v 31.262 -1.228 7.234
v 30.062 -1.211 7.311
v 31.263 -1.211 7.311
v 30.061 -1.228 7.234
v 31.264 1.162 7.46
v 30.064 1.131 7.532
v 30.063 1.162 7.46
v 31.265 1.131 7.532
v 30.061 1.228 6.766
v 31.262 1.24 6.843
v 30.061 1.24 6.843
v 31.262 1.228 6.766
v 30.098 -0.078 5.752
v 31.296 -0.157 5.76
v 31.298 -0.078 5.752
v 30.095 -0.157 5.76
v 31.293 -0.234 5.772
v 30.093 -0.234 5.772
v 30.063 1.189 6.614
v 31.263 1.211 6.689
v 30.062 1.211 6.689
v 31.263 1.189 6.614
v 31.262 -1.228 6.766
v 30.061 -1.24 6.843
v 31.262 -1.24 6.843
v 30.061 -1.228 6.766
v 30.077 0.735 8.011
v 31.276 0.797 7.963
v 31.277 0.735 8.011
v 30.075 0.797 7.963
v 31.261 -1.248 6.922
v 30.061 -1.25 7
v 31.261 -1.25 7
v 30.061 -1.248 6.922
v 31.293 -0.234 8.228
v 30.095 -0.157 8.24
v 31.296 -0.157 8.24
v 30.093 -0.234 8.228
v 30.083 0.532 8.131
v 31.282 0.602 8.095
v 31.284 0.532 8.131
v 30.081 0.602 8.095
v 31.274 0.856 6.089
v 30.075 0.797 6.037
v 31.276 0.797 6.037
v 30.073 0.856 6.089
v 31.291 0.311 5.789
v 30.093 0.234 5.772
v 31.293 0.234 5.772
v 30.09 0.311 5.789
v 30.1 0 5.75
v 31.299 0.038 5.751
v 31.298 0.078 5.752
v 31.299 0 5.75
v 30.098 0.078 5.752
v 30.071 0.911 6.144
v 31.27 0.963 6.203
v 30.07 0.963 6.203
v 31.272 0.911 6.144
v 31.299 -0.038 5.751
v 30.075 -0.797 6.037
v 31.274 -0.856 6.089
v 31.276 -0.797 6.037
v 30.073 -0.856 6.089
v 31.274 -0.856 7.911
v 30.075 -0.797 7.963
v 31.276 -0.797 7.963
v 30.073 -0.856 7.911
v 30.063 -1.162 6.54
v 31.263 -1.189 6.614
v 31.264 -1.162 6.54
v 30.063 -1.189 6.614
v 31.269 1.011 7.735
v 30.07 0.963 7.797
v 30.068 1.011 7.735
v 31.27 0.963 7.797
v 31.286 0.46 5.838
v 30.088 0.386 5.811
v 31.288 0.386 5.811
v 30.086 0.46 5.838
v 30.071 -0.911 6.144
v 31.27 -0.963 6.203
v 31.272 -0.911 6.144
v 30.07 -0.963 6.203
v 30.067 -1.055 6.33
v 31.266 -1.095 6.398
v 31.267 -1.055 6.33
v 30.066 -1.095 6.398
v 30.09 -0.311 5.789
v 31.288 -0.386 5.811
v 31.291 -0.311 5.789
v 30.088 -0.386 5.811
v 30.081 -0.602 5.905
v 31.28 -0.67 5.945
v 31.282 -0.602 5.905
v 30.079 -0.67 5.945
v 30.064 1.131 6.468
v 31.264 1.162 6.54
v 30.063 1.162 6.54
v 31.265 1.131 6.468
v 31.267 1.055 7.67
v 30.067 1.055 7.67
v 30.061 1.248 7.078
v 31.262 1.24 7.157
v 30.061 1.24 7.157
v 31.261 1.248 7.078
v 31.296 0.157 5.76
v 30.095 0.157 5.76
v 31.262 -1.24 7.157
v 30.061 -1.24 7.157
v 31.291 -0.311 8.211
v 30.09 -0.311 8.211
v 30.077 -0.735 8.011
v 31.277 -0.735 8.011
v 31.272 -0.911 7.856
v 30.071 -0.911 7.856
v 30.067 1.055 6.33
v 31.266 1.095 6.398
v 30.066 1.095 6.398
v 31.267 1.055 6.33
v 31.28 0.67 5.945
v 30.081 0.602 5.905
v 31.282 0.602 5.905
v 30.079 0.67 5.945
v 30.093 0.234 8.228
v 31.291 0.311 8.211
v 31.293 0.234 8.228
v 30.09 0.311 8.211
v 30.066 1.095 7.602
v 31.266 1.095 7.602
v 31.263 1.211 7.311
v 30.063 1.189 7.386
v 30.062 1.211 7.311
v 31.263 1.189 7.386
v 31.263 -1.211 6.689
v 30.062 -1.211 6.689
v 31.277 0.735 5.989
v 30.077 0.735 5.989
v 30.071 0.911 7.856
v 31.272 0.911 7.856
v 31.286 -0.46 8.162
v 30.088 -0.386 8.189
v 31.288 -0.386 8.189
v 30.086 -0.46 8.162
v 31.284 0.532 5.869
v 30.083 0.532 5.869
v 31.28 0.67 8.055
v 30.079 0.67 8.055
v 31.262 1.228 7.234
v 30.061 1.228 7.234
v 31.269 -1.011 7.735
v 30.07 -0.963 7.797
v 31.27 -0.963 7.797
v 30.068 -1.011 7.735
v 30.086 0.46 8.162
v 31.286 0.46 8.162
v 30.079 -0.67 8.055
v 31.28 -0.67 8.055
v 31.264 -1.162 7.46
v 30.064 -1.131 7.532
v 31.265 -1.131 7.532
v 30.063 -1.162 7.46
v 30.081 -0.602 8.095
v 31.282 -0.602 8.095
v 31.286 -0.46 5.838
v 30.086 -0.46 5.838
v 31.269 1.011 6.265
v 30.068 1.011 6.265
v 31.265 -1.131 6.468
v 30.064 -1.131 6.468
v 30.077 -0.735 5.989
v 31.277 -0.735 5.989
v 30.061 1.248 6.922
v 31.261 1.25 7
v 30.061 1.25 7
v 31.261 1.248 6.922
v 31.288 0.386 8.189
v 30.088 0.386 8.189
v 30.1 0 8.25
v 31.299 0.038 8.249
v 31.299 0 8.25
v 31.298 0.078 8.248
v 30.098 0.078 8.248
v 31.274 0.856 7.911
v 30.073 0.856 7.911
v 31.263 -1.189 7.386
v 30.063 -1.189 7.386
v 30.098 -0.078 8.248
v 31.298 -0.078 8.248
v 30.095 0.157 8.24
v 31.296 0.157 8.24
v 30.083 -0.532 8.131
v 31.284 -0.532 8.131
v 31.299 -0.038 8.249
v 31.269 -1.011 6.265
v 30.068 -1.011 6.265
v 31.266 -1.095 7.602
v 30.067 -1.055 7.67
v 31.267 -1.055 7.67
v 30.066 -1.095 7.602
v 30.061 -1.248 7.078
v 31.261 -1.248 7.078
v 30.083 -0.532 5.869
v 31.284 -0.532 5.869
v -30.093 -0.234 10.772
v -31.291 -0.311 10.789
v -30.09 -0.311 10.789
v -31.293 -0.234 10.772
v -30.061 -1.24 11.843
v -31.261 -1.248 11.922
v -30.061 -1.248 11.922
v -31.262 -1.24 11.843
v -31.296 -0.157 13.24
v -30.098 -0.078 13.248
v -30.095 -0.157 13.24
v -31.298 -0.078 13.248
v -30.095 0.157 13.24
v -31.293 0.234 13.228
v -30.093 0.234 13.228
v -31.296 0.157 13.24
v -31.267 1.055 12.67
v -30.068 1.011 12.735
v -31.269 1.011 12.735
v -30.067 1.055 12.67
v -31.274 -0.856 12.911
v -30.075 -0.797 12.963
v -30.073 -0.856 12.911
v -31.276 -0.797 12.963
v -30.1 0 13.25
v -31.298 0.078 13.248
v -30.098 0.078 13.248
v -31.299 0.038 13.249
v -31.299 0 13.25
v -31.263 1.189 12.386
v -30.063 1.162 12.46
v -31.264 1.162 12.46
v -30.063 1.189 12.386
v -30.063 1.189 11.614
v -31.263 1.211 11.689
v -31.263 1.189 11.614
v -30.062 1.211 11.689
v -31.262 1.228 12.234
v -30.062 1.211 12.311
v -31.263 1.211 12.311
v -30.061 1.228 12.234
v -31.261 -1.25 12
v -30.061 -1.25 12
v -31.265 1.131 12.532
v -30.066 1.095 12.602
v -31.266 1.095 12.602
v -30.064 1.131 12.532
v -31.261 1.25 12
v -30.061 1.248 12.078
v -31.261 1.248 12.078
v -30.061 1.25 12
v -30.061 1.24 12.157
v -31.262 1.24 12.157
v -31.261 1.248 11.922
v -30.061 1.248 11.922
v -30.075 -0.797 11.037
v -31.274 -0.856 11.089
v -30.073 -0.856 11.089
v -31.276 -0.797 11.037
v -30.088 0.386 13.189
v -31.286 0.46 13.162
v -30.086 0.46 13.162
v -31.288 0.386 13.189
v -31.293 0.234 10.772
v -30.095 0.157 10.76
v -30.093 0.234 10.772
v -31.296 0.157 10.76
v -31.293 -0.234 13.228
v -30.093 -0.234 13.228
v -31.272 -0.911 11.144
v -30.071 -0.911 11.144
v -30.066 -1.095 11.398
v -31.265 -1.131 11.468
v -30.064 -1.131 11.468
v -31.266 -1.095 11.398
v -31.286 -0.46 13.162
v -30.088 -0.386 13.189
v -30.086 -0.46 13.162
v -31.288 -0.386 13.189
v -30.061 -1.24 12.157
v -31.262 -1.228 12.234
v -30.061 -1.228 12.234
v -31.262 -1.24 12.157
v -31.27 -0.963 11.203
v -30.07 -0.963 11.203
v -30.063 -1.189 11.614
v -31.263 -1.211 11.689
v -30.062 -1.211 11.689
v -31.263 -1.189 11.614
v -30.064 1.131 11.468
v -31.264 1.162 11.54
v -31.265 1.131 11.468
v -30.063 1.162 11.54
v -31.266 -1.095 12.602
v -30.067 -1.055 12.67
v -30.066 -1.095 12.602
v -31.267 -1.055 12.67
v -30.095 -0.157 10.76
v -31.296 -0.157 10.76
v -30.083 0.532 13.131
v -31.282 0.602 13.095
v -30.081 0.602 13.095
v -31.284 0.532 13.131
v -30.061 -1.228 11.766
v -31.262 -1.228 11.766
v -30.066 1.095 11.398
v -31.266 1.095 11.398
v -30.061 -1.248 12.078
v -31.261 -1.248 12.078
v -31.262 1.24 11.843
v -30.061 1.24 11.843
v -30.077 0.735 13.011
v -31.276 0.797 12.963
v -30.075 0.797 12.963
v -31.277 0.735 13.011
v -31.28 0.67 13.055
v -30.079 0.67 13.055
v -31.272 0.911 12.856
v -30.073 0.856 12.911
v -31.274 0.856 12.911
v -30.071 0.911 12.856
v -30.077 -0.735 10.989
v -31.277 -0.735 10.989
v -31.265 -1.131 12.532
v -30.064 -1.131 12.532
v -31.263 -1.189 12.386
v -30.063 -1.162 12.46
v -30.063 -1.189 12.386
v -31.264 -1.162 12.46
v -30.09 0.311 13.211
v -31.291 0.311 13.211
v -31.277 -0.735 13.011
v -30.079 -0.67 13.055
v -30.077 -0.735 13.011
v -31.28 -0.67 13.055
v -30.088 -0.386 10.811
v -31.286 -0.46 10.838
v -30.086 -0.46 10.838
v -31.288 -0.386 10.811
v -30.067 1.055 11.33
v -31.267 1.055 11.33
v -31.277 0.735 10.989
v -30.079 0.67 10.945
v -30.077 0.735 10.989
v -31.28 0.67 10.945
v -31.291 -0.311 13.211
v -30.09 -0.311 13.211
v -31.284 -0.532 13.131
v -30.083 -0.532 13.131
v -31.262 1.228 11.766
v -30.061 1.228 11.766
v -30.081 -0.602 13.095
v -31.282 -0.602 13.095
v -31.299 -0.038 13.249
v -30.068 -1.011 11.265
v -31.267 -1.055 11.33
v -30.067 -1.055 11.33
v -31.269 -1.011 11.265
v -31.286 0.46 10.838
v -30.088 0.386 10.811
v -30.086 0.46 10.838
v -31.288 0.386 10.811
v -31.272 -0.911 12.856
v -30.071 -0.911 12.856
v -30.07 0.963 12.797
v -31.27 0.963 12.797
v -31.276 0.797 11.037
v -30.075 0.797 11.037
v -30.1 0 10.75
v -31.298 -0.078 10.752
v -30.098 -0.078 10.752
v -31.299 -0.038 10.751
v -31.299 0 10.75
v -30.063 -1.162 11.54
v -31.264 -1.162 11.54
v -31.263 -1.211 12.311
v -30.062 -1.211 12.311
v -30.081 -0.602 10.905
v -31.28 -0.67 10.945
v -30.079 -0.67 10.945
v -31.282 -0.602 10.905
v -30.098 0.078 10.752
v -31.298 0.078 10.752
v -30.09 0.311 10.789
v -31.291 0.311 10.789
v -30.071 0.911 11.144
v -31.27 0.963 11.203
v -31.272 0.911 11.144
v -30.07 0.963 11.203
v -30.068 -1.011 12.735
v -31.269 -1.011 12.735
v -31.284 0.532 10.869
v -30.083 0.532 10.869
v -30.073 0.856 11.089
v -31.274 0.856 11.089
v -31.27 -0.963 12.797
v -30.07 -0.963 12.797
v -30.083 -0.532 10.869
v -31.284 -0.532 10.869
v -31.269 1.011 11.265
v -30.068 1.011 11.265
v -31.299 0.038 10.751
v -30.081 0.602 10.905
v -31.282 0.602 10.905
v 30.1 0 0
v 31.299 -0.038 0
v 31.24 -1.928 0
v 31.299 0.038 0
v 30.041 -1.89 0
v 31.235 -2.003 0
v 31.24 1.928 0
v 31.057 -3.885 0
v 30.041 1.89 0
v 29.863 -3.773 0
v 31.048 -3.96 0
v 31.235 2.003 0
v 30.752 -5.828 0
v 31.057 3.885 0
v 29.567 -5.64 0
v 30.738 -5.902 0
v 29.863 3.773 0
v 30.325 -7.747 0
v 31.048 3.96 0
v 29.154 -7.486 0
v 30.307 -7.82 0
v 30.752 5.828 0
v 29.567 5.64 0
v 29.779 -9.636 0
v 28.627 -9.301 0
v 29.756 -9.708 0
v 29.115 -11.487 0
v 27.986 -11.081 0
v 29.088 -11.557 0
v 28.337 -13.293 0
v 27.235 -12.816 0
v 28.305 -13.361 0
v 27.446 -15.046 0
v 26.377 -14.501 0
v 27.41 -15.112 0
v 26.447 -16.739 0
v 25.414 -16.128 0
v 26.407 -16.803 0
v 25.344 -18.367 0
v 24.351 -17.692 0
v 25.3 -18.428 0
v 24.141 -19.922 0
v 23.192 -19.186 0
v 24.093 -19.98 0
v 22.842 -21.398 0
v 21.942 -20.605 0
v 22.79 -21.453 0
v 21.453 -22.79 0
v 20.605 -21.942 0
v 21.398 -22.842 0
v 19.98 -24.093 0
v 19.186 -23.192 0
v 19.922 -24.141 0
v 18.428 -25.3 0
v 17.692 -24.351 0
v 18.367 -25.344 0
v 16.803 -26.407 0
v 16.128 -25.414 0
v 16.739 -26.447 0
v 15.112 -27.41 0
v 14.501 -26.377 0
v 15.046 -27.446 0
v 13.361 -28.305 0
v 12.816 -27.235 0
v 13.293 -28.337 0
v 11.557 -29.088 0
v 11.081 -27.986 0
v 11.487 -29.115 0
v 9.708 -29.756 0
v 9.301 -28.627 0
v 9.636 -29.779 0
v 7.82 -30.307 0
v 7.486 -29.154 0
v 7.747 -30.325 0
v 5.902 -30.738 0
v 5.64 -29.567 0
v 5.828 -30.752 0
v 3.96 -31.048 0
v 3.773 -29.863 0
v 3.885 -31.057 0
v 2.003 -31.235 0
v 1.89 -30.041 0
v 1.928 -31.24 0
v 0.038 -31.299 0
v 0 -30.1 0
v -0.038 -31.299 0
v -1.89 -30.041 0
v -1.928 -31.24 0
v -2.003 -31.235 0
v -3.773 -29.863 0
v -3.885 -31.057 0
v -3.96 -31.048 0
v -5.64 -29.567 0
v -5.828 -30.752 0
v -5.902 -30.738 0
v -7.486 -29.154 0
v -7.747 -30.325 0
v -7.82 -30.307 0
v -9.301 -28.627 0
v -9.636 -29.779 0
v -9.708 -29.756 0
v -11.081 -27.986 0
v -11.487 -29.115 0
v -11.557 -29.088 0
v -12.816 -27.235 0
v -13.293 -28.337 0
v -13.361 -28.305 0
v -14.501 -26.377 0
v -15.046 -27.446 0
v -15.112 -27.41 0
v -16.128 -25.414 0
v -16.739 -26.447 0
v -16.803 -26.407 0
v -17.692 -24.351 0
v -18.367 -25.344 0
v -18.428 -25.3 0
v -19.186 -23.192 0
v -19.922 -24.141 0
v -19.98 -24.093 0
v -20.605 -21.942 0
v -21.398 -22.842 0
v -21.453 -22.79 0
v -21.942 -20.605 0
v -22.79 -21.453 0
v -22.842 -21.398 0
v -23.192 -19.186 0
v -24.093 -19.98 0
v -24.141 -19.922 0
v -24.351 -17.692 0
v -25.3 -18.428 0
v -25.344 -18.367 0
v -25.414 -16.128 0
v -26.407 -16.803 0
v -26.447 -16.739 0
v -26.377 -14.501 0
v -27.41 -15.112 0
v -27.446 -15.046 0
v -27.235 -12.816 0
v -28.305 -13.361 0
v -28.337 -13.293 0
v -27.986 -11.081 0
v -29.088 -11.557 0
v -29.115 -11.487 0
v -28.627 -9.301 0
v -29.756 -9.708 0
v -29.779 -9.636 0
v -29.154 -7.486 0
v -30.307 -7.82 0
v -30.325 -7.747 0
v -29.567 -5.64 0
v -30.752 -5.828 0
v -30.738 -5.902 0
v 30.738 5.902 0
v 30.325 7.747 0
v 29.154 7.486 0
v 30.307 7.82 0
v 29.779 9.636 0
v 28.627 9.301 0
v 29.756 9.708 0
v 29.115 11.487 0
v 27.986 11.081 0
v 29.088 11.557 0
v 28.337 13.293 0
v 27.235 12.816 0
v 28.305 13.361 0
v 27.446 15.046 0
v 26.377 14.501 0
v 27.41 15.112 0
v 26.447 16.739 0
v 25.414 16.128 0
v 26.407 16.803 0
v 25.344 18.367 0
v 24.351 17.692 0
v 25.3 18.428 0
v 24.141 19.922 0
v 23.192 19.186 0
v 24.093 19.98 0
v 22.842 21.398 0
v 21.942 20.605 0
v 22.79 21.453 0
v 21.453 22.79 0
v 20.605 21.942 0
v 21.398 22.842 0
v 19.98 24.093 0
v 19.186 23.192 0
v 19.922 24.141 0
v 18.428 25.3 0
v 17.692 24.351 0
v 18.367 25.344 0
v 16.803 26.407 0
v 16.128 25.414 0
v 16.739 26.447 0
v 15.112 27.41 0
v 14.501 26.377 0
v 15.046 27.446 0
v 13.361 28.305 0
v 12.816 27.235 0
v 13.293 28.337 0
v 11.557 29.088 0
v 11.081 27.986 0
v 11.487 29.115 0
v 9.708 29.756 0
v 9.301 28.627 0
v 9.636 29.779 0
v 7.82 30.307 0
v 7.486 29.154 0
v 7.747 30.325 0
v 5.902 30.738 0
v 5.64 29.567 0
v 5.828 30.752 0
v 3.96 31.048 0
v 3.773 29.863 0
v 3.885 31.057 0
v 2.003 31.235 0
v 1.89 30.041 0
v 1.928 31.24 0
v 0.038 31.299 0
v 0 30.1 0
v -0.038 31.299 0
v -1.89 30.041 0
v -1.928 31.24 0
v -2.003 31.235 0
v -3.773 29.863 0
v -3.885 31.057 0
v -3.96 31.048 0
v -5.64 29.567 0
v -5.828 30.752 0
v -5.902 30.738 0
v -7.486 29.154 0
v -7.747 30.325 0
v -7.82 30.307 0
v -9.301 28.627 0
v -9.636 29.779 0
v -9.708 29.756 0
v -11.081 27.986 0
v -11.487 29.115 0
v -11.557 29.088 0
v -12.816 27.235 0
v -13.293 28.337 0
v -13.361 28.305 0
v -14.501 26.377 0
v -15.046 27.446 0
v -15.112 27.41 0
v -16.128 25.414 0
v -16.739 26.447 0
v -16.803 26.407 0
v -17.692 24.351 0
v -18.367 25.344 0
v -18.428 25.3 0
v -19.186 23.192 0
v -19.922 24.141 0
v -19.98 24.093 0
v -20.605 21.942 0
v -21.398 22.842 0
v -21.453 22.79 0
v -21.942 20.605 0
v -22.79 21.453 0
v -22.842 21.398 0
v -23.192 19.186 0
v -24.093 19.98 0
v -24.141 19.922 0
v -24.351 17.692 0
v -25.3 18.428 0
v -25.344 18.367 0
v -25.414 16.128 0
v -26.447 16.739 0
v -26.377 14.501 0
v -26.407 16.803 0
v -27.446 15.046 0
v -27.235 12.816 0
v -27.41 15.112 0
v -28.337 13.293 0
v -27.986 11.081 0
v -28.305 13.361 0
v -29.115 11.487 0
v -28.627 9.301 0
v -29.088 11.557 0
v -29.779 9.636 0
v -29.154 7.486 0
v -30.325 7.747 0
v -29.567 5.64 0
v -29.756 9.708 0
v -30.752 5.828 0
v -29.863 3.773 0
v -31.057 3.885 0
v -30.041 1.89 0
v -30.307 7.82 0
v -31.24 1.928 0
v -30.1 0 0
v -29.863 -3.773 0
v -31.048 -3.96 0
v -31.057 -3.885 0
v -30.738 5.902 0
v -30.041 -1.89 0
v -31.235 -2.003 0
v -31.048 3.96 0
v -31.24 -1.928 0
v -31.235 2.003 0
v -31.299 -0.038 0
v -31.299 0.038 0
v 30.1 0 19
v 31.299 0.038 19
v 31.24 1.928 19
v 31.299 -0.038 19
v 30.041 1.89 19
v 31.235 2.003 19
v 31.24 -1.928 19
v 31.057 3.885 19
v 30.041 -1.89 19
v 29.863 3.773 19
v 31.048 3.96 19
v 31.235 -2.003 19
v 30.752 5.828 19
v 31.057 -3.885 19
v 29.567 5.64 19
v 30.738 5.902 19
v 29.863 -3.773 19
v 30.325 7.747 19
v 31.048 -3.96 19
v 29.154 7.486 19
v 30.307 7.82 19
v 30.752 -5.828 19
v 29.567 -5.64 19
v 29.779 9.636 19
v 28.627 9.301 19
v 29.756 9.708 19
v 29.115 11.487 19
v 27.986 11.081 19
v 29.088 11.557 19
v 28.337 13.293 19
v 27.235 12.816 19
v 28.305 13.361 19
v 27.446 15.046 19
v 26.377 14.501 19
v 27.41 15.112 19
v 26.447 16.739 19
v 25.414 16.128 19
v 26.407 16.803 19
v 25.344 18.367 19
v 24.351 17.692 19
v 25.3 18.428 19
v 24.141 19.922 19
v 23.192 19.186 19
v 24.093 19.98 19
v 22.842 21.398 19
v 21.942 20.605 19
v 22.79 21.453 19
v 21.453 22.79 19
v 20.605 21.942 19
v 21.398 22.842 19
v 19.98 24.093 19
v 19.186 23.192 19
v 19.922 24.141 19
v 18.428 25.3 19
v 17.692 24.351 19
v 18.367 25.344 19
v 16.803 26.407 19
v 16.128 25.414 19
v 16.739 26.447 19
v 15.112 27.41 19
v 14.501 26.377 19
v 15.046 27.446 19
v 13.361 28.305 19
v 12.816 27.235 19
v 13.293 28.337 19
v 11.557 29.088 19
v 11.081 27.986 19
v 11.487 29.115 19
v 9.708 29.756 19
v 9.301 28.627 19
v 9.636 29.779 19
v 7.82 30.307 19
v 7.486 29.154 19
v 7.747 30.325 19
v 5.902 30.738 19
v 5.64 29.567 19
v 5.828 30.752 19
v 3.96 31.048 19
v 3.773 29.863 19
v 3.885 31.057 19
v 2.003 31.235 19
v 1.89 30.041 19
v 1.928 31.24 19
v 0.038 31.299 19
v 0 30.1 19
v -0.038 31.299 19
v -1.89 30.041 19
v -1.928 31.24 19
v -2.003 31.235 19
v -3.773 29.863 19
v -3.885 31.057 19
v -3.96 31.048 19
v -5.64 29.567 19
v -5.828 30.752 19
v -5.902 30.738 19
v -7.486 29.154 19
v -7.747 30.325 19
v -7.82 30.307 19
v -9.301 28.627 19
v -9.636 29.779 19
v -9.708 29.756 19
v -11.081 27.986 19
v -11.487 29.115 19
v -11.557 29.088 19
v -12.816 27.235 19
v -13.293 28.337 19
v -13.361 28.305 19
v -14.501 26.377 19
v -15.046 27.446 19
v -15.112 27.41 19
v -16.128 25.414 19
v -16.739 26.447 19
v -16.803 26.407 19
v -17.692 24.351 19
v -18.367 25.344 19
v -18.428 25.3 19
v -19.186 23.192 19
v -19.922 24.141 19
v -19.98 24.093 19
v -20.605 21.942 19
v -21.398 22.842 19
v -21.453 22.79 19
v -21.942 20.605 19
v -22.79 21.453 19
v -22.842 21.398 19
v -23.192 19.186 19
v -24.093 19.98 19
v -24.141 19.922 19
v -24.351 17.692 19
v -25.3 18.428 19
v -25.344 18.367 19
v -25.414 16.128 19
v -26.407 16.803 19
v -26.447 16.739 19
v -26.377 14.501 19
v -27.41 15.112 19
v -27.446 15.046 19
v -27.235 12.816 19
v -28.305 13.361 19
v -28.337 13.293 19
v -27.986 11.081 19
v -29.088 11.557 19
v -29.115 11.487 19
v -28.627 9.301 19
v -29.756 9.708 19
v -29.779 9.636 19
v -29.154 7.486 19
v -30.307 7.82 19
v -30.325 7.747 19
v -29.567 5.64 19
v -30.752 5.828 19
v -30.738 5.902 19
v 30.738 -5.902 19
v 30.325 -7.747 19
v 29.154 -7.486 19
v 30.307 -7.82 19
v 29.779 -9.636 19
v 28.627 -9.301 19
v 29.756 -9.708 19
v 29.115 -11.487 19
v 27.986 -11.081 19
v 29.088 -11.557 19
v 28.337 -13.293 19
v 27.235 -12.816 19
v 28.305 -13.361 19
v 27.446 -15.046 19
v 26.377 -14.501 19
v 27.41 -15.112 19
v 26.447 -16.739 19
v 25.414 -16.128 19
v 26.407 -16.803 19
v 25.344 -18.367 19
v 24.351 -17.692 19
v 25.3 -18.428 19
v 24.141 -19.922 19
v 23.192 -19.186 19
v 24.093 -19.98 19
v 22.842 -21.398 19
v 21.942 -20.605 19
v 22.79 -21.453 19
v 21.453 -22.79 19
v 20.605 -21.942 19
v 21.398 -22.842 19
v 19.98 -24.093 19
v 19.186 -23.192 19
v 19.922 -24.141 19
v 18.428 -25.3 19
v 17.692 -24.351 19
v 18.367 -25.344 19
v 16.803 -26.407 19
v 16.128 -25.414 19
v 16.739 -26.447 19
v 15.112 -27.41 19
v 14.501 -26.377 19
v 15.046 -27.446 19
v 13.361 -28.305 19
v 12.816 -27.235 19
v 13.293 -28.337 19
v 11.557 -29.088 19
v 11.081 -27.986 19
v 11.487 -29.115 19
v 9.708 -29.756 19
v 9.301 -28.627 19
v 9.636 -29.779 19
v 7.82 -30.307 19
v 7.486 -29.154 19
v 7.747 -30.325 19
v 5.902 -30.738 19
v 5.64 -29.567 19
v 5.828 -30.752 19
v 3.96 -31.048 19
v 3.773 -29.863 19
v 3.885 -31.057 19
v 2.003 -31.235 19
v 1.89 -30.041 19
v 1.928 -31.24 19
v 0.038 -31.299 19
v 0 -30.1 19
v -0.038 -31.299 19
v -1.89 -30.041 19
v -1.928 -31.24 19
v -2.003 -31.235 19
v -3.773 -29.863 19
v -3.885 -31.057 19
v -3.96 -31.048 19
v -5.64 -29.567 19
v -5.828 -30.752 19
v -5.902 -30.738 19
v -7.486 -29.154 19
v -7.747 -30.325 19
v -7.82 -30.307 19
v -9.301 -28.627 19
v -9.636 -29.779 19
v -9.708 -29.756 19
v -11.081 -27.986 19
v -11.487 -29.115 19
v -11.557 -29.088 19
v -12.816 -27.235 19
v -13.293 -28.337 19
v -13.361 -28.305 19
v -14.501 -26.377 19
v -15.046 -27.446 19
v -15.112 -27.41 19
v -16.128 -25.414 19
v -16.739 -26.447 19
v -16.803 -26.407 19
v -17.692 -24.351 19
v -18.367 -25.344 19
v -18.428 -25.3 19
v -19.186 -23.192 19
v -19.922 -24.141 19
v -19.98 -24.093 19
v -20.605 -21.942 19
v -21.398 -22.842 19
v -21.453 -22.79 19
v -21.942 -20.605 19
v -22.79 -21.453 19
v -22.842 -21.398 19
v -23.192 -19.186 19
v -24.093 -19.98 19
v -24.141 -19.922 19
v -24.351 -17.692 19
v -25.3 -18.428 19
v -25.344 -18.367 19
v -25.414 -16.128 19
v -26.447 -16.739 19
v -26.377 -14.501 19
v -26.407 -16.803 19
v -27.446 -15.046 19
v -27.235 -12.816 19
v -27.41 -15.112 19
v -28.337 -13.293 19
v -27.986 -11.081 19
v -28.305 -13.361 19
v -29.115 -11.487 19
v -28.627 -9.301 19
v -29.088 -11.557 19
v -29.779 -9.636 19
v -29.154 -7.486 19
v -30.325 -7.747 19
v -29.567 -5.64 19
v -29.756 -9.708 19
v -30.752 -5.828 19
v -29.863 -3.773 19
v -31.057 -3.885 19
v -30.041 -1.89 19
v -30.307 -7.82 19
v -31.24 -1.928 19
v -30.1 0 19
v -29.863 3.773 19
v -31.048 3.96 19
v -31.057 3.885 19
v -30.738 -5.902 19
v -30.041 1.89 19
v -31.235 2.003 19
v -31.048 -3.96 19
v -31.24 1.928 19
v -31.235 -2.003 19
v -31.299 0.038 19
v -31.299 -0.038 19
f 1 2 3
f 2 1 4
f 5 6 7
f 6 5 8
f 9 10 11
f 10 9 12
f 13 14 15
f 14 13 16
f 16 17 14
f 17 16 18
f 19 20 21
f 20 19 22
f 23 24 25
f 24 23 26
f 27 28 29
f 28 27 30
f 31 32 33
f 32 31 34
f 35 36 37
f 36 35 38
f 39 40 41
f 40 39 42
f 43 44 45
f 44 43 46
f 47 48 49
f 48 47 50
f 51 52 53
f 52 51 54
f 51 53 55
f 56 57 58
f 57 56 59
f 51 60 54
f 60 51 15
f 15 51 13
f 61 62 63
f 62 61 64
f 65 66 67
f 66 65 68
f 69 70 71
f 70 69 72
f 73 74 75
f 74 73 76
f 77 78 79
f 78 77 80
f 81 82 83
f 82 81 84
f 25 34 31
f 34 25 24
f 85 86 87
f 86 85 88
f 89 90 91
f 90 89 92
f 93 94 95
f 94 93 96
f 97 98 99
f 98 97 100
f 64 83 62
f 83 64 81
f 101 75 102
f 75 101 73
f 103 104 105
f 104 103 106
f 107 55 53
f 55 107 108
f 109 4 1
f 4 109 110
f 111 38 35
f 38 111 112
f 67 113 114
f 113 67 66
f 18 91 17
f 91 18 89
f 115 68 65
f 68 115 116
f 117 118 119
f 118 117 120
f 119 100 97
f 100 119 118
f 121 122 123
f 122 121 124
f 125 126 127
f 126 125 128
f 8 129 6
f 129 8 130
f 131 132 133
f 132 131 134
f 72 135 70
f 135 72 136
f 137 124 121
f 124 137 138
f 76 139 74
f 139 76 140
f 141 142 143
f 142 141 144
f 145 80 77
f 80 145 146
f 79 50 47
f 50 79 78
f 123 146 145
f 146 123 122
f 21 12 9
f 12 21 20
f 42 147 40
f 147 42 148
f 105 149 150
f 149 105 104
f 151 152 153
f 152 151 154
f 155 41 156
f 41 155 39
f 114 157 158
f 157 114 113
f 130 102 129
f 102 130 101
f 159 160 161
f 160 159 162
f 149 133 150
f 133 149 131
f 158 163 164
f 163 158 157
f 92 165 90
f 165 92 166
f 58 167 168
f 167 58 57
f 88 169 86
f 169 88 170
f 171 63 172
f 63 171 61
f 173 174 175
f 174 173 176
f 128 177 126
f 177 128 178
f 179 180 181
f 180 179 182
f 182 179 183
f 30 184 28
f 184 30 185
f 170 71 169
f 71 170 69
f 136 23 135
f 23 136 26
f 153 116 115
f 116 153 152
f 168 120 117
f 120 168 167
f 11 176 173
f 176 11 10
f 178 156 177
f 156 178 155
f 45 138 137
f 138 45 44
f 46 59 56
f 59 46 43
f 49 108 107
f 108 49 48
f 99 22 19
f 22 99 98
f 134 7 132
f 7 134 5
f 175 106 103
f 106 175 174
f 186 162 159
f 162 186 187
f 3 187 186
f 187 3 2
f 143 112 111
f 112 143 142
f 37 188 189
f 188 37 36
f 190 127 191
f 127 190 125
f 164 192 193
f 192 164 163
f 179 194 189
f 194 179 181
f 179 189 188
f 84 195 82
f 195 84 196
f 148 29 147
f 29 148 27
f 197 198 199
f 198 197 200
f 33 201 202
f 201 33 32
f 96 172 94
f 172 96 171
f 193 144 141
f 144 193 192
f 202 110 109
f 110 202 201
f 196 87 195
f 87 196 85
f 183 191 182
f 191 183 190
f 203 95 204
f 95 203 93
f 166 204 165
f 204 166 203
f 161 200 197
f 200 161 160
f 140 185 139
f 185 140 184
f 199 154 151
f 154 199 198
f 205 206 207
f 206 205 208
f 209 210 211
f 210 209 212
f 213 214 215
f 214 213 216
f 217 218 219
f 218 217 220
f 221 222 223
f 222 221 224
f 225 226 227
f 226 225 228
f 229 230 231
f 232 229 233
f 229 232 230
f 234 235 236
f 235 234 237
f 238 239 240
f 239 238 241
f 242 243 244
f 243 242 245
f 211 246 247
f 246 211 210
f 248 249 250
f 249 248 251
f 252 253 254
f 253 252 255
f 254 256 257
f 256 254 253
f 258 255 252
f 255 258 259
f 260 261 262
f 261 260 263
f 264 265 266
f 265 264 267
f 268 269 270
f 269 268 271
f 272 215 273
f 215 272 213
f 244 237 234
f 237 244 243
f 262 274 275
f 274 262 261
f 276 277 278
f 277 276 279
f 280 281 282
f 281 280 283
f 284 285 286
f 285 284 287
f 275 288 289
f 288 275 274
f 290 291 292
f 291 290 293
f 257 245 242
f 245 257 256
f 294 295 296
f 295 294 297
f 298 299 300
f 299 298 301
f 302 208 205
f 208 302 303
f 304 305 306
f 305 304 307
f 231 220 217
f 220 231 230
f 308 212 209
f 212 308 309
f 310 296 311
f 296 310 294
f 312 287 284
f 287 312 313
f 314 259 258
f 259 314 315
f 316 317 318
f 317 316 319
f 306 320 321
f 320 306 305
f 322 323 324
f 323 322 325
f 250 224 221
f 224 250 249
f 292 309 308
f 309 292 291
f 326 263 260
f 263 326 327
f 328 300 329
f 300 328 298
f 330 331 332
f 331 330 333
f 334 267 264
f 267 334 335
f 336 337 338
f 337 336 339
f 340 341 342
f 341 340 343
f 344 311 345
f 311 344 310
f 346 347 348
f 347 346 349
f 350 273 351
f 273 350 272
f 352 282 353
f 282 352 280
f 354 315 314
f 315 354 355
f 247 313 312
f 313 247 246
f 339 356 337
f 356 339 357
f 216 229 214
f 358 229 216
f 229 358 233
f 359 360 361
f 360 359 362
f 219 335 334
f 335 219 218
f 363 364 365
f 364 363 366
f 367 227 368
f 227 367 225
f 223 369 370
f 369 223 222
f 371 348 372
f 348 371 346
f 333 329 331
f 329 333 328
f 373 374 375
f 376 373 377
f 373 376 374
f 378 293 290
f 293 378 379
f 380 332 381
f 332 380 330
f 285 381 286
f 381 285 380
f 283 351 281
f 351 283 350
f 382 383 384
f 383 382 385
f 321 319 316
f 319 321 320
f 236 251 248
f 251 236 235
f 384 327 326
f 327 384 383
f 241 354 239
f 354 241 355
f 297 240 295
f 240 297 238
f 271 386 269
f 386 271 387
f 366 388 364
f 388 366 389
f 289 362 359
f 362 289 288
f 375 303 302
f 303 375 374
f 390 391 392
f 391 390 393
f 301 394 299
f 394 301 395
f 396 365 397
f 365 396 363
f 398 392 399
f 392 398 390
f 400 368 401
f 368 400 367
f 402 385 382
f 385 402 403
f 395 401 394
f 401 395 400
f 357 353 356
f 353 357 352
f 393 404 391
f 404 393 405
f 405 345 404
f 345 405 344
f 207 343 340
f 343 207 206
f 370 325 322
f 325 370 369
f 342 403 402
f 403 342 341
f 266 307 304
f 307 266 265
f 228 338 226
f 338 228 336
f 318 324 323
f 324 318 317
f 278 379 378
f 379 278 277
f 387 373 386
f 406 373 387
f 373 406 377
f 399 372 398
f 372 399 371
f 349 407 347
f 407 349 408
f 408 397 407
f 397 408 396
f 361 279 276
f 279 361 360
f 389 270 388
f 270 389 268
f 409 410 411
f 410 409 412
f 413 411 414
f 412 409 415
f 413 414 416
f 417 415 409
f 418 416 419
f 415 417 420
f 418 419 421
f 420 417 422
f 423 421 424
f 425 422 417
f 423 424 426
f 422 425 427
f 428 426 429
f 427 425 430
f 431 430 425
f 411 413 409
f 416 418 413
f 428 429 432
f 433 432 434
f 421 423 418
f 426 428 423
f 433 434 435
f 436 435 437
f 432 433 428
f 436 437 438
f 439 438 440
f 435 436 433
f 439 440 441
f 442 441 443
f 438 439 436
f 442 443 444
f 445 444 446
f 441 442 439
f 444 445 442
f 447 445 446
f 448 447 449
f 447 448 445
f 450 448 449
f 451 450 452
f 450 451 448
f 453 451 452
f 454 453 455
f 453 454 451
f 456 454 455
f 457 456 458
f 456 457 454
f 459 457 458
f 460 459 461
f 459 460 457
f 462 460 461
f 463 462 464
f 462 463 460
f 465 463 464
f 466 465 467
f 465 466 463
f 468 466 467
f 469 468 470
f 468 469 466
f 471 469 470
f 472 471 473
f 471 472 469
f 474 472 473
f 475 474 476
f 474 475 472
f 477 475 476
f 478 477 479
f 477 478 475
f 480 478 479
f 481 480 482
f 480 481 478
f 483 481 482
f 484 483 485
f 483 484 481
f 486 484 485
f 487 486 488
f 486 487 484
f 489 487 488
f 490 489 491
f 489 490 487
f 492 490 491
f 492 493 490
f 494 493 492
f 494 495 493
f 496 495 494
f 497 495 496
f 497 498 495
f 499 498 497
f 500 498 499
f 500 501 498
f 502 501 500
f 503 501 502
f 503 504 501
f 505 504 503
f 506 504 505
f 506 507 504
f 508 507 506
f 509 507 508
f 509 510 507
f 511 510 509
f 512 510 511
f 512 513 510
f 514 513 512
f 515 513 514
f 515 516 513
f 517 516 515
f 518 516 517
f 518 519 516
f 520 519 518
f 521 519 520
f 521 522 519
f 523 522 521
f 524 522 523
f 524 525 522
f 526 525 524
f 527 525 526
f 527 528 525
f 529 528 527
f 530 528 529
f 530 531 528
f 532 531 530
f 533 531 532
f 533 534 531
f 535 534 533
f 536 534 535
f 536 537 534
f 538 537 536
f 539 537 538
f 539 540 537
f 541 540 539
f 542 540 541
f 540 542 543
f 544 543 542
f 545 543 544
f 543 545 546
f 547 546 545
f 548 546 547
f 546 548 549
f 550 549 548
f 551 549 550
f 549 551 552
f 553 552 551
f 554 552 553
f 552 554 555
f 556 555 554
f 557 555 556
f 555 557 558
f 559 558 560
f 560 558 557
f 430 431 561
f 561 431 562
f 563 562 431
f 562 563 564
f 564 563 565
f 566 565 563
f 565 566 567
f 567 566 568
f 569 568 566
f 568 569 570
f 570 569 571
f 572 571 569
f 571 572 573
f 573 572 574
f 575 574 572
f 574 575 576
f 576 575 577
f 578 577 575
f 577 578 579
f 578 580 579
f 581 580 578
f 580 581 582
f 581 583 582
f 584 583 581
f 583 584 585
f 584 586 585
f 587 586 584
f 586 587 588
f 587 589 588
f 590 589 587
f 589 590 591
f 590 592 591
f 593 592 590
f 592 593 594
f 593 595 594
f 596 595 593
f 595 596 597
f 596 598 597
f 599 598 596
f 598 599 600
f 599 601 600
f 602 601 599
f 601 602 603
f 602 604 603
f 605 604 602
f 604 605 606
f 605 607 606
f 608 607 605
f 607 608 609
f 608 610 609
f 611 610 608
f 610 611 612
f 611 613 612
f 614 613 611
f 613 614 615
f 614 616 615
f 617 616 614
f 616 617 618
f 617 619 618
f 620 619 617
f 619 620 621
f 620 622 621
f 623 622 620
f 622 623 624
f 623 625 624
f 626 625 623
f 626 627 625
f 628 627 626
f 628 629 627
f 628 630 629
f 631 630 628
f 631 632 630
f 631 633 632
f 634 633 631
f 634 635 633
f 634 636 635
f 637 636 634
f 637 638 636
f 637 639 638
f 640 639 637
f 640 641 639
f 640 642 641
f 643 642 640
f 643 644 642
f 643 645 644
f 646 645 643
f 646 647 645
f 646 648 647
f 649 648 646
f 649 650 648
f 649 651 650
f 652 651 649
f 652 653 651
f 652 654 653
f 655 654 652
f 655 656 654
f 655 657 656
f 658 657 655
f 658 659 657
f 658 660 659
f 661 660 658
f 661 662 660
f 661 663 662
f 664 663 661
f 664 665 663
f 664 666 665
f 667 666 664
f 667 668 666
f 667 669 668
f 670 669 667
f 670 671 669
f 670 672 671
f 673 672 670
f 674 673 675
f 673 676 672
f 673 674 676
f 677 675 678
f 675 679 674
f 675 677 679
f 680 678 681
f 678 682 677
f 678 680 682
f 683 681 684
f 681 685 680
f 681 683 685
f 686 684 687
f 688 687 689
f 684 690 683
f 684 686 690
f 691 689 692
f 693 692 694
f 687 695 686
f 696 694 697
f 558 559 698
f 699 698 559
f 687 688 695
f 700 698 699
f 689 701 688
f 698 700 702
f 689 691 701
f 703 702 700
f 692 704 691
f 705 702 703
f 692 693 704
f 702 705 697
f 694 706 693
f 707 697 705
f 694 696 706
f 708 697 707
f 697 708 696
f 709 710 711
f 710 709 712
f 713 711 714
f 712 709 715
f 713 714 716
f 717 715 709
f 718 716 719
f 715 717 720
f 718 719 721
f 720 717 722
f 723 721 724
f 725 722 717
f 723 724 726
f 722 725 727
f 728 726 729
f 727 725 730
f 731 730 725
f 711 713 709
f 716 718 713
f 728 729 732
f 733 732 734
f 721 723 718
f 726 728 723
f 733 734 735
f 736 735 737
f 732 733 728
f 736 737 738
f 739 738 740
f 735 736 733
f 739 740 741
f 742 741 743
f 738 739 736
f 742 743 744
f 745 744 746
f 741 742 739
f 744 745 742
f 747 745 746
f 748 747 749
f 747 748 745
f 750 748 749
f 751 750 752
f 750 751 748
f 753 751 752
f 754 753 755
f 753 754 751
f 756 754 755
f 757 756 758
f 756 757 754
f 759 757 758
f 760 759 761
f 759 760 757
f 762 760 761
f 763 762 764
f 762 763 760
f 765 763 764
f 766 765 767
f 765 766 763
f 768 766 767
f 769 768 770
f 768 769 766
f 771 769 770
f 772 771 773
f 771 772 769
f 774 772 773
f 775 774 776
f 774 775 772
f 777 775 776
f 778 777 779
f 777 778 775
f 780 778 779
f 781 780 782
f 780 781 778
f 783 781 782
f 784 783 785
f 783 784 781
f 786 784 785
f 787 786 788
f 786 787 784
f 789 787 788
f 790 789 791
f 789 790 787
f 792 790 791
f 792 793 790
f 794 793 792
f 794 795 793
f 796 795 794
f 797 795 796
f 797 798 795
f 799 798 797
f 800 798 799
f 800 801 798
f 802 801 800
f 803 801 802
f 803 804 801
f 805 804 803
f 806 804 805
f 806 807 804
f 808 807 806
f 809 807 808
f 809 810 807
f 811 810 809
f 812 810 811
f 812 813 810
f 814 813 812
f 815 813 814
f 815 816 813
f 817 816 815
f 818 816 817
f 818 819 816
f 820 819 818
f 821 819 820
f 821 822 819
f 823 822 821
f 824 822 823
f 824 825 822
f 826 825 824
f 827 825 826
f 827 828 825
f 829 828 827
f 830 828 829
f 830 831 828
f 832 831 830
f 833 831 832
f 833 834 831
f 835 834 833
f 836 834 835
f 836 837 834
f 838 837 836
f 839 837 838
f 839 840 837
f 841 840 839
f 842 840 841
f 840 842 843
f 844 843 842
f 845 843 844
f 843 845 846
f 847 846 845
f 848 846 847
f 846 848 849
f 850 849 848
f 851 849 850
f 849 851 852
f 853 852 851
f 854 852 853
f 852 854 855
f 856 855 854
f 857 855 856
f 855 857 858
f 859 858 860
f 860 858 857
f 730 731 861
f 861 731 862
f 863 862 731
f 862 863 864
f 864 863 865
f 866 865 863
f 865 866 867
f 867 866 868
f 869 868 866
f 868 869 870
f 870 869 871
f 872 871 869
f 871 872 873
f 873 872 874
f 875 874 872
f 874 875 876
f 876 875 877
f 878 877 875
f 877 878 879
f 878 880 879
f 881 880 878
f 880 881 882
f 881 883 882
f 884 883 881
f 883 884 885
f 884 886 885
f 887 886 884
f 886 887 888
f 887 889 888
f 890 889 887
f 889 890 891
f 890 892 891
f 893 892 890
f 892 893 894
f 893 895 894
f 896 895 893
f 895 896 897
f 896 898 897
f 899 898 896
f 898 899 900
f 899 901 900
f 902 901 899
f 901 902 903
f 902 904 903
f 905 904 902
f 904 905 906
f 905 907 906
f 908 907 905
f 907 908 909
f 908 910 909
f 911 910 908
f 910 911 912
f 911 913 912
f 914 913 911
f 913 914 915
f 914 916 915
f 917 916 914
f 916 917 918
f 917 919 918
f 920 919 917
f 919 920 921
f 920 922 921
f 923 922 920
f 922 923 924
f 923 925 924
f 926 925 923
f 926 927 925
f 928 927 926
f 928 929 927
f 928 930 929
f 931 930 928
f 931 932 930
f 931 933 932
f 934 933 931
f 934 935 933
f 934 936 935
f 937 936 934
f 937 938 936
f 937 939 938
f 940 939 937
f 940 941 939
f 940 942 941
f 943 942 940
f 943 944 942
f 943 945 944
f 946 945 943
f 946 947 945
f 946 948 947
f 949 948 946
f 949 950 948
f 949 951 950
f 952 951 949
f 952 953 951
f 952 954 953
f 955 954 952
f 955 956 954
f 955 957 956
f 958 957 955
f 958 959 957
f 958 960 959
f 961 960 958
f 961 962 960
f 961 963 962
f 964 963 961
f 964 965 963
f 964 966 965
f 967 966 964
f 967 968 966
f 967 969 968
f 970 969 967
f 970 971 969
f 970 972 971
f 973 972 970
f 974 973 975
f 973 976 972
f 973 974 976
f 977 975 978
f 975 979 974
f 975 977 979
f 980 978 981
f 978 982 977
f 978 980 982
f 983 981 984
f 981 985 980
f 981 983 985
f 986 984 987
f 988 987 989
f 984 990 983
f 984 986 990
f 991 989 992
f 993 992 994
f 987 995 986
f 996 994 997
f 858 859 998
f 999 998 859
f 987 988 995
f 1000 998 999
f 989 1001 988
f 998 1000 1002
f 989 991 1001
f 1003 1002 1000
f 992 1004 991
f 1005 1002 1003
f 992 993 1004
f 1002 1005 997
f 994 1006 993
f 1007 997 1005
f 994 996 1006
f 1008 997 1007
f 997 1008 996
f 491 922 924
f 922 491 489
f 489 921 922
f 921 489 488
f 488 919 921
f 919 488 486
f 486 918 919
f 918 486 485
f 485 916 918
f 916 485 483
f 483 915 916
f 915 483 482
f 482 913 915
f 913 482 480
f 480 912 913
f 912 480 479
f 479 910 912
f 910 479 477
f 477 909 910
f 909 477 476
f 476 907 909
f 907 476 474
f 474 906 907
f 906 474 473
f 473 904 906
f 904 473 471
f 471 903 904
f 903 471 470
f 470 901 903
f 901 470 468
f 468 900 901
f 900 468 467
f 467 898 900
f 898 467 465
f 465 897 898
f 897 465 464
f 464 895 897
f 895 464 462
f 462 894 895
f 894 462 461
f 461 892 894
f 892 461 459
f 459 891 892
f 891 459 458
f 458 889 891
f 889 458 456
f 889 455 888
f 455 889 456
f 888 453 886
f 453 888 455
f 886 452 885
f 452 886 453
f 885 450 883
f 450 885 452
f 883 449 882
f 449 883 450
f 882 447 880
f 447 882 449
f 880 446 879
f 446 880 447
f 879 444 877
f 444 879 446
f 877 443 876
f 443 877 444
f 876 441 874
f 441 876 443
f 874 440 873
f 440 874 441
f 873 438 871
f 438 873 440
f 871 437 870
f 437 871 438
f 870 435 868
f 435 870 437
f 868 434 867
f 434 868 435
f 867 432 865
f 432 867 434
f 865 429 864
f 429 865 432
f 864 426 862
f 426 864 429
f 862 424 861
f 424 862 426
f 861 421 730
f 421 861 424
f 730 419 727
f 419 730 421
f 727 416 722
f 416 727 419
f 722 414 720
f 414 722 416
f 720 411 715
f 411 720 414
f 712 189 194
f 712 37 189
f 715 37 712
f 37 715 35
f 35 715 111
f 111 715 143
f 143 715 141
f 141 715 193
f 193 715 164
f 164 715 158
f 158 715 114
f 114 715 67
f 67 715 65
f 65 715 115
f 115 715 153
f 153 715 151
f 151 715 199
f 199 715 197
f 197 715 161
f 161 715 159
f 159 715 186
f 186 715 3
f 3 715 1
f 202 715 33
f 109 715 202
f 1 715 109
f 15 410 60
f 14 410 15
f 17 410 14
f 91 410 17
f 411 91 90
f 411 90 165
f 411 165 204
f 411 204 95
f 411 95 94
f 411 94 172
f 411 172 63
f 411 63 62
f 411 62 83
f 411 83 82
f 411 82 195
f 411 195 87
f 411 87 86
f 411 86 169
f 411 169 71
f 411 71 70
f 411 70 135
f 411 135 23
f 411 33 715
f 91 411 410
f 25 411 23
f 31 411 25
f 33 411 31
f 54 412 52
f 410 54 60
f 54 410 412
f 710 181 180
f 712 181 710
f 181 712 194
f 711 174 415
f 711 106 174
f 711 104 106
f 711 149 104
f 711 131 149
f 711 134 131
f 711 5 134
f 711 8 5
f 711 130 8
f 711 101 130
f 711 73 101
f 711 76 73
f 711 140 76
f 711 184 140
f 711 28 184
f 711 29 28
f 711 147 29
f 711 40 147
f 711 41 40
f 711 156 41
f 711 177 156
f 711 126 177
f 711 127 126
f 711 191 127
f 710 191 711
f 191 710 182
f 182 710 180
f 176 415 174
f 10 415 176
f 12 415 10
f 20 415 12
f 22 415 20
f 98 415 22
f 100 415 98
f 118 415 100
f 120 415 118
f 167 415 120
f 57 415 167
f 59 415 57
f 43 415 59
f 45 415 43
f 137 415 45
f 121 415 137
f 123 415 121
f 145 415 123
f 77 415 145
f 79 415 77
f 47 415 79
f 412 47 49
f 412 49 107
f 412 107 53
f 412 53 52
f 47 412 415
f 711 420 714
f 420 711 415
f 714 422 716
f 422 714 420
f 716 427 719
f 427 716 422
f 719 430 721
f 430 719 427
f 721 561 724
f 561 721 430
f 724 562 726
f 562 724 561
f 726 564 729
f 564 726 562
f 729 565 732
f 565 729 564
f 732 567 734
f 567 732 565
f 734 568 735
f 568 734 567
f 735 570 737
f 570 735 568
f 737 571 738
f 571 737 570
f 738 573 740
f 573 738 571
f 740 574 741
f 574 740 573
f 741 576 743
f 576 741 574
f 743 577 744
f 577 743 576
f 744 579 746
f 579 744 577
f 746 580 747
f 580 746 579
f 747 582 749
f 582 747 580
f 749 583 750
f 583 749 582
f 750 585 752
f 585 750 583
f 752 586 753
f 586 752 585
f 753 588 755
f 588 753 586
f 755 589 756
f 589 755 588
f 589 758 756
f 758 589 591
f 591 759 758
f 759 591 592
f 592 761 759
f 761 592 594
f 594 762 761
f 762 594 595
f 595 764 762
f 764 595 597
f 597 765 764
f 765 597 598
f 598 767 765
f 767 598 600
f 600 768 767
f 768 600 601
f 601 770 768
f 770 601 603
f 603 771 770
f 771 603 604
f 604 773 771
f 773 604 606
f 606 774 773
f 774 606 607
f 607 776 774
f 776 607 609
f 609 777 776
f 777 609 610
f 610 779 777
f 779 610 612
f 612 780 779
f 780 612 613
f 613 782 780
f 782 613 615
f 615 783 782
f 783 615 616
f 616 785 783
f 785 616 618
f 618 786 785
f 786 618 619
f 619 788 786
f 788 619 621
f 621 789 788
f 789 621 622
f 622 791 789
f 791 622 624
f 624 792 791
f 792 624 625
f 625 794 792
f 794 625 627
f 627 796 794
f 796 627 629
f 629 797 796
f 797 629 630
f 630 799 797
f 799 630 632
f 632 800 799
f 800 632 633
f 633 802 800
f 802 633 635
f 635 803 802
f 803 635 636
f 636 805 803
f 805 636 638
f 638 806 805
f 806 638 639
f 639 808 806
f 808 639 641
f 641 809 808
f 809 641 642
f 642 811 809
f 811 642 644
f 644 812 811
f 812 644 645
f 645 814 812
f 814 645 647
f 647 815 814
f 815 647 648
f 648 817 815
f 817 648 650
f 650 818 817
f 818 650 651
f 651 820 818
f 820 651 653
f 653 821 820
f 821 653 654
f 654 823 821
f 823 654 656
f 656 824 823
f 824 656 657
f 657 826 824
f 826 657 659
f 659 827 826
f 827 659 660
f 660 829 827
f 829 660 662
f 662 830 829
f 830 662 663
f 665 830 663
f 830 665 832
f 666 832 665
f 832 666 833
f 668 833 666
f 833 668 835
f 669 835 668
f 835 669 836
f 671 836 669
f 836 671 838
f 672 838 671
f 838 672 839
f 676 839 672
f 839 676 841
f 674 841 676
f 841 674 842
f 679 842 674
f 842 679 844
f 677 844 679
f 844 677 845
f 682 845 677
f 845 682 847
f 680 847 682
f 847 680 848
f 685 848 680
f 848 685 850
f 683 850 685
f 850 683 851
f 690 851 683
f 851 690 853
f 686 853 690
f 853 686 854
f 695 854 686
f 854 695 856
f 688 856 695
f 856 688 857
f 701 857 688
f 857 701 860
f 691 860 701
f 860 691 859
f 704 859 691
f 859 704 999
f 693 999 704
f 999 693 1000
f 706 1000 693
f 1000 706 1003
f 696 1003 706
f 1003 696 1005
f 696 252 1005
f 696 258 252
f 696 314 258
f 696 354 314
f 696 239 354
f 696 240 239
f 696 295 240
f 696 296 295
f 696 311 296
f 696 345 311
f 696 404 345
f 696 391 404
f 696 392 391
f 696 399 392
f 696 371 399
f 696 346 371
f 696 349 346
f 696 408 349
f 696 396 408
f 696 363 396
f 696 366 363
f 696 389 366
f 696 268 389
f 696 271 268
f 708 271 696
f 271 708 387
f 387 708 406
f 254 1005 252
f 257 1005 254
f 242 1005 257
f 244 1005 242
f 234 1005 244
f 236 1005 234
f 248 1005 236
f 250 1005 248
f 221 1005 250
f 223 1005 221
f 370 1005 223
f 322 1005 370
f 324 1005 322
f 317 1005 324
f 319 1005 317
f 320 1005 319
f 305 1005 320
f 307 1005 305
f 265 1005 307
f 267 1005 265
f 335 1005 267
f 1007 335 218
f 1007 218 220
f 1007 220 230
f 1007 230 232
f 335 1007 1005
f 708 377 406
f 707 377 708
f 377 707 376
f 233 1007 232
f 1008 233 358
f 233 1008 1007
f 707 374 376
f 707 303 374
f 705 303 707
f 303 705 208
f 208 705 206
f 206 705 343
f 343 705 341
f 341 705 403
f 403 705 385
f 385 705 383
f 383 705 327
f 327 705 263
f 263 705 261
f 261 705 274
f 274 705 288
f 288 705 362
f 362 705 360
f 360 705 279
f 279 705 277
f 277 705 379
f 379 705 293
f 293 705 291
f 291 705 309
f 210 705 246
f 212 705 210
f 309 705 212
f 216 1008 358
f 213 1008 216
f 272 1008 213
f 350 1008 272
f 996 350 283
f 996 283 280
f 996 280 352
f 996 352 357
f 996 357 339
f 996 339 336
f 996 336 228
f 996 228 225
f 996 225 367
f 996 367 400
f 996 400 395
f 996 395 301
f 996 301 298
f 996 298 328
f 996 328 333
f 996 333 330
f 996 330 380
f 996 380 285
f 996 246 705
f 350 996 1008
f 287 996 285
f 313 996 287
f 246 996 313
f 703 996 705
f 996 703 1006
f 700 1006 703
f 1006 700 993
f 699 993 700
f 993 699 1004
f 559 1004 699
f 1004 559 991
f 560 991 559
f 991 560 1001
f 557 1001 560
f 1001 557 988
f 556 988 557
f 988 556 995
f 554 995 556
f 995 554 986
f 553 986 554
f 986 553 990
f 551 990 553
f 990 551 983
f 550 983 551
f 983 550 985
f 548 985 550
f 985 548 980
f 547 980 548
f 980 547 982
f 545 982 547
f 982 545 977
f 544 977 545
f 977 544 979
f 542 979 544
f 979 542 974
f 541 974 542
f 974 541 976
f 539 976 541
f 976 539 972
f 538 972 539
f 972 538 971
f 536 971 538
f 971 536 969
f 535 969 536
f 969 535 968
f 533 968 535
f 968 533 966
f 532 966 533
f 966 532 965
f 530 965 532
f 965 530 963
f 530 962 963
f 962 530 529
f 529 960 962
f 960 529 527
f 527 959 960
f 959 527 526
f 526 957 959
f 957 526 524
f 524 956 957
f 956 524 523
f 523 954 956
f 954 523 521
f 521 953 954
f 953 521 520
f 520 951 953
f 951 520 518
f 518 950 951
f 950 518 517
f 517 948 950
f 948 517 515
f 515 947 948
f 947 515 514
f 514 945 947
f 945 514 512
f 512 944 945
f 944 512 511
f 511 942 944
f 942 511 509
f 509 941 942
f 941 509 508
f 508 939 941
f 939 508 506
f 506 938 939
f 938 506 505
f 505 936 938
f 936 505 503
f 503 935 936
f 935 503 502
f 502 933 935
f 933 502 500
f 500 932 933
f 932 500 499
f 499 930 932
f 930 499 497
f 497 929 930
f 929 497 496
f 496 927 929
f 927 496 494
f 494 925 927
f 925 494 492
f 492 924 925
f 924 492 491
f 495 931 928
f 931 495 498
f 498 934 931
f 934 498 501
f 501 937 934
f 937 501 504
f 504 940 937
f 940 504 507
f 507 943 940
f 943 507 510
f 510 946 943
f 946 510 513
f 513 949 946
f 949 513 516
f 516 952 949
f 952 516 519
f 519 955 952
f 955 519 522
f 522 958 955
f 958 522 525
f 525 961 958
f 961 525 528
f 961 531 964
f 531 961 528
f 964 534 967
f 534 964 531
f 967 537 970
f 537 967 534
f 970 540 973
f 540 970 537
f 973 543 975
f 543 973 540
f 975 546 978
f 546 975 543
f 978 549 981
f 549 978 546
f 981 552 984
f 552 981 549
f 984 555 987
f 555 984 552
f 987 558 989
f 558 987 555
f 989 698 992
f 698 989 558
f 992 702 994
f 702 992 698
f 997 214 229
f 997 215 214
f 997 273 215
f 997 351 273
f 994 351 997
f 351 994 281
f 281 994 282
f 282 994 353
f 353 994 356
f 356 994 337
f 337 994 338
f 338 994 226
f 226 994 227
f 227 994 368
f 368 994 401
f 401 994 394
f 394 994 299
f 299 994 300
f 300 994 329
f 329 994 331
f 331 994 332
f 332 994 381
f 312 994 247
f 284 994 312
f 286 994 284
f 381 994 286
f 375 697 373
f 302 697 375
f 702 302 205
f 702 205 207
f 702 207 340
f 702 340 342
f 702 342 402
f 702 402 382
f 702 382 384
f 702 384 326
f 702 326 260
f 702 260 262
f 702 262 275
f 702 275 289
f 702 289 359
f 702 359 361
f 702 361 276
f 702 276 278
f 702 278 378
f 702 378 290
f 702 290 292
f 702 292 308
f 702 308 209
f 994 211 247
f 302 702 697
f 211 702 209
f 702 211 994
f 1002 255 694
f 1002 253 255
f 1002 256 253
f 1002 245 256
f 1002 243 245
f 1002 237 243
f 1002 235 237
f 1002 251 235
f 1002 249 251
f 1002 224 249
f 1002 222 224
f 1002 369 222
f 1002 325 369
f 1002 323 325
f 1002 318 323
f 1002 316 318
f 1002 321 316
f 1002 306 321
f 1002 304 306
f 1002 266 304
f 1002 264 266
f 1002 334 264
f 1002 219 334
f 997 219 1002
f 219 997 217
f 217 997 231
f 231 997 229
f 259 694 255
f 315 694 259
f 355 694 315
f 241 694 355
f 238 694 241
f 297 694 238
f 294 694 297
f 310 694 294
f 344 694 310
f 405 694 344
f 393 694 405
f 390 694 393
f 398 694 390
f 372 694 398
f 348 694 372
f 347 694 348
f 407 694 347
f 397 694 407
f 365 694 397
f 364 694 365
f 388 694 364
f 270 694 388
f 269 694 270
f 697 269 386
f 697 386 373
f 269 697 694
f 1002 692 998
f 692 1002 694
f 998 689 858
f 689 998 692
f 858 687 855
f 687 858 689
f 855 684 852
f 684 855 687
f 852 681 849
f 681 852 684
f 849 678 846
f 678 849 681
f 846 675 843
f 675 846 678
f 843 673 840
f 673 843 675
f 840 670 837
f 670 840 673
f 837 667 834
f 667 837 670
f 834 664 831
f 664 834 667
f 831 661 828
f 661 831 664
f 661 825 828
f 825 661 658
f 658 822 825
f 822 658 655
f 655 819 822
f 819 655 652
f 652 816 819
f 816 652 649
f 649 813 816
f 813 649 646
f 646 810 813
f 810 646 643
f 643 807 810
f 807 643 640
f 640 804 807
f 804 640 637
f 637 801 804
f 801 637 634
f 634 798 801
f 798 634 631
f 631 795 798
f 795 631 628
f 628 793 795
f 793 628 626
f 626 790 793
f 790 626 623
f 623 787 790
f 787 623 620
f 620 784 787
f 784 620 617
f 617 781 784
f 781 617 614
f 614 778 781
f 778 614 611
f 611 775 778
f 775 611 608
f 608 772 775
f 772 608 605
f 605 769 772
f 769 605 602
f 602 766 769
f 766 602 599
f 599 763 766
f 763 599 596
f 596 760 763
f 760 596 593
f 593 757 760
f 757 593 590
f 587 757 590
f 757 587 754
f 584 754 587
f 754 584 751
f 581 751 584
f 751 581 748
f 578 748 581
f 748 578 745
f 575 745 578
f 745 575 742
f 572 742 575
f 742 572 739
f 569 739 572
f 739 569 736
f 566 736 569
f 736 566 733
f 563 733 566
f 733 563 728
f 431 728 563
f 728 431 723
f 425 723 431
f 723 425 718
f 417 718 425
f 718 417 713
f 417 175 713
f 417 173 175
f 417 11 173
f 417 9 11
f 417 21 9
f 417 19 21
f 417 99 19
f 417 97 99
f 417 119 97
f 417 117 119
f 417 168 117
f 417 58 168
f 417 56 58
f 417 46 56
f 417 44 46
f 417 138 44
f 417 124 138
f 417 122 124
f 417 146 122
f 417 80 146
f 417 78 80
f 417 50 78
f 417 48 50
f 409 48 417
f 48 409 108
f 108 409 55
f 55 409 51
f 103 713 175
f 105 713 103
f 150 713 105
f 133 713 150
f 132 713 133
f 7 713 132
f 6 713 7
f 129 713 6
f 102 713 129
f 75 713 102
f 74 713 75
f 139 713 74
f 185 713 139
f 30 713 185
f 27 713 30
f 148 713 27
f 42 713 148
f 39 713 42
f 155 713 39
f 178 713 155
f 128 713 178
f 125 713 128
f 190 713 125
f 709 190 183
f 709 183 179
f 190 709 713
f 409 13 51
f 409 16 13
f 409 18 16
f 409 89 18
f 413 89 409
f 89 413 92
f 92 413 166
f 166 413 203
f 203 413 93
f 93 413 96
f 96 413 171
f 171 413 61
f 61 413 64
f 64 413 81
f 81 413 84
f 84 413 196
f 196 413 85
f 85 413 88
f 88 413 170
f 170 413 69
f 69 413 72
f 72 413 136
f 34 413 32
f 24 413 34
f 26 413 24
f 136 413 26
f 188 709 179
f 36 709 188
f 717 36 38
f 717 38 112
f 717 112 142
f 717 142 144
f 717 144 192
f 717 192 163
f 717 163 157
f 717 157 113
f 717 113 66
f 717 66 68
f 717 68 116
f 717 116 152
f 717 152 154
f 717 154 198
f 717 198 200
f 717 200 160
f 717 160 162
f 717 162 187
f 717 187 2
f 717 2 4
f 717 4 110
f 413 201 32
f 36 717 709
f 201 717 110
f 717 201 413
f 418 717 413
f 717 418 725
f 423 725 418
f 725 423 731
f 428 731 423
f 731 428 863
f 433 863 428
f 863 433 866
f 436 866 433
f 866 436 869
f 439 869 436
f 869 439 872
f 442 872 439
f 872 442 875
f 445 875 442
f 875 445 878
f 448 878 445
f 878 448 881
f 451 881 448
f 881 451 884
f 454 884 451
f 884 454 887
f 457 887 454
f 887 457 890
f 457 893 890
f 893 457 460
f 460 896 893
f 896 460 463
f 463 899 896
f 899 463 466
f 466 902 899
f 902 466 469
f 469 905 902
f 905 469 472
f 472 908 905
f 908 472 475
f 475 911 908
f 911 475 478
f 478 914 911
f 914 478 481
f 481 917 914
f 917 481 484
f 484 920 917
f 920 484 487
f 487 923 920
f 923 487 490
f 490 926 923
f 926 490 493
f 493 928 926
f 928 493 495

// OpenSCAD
D = 60.2;
H=19;
$fn=100;

difference(){

linear_extrude(H)
difference(){
offset(r=1.2) circle(d=D);
circle(d=D);
}

union(){
    translate([10,0,7])
    rotate([0,90,0])
    cylinder(d=2.5,h=D/2);

    translate([-10,0,H-7])
    rotate([0,-90,0])
    cylinder(d=2.5,h=D/2);
}

}
